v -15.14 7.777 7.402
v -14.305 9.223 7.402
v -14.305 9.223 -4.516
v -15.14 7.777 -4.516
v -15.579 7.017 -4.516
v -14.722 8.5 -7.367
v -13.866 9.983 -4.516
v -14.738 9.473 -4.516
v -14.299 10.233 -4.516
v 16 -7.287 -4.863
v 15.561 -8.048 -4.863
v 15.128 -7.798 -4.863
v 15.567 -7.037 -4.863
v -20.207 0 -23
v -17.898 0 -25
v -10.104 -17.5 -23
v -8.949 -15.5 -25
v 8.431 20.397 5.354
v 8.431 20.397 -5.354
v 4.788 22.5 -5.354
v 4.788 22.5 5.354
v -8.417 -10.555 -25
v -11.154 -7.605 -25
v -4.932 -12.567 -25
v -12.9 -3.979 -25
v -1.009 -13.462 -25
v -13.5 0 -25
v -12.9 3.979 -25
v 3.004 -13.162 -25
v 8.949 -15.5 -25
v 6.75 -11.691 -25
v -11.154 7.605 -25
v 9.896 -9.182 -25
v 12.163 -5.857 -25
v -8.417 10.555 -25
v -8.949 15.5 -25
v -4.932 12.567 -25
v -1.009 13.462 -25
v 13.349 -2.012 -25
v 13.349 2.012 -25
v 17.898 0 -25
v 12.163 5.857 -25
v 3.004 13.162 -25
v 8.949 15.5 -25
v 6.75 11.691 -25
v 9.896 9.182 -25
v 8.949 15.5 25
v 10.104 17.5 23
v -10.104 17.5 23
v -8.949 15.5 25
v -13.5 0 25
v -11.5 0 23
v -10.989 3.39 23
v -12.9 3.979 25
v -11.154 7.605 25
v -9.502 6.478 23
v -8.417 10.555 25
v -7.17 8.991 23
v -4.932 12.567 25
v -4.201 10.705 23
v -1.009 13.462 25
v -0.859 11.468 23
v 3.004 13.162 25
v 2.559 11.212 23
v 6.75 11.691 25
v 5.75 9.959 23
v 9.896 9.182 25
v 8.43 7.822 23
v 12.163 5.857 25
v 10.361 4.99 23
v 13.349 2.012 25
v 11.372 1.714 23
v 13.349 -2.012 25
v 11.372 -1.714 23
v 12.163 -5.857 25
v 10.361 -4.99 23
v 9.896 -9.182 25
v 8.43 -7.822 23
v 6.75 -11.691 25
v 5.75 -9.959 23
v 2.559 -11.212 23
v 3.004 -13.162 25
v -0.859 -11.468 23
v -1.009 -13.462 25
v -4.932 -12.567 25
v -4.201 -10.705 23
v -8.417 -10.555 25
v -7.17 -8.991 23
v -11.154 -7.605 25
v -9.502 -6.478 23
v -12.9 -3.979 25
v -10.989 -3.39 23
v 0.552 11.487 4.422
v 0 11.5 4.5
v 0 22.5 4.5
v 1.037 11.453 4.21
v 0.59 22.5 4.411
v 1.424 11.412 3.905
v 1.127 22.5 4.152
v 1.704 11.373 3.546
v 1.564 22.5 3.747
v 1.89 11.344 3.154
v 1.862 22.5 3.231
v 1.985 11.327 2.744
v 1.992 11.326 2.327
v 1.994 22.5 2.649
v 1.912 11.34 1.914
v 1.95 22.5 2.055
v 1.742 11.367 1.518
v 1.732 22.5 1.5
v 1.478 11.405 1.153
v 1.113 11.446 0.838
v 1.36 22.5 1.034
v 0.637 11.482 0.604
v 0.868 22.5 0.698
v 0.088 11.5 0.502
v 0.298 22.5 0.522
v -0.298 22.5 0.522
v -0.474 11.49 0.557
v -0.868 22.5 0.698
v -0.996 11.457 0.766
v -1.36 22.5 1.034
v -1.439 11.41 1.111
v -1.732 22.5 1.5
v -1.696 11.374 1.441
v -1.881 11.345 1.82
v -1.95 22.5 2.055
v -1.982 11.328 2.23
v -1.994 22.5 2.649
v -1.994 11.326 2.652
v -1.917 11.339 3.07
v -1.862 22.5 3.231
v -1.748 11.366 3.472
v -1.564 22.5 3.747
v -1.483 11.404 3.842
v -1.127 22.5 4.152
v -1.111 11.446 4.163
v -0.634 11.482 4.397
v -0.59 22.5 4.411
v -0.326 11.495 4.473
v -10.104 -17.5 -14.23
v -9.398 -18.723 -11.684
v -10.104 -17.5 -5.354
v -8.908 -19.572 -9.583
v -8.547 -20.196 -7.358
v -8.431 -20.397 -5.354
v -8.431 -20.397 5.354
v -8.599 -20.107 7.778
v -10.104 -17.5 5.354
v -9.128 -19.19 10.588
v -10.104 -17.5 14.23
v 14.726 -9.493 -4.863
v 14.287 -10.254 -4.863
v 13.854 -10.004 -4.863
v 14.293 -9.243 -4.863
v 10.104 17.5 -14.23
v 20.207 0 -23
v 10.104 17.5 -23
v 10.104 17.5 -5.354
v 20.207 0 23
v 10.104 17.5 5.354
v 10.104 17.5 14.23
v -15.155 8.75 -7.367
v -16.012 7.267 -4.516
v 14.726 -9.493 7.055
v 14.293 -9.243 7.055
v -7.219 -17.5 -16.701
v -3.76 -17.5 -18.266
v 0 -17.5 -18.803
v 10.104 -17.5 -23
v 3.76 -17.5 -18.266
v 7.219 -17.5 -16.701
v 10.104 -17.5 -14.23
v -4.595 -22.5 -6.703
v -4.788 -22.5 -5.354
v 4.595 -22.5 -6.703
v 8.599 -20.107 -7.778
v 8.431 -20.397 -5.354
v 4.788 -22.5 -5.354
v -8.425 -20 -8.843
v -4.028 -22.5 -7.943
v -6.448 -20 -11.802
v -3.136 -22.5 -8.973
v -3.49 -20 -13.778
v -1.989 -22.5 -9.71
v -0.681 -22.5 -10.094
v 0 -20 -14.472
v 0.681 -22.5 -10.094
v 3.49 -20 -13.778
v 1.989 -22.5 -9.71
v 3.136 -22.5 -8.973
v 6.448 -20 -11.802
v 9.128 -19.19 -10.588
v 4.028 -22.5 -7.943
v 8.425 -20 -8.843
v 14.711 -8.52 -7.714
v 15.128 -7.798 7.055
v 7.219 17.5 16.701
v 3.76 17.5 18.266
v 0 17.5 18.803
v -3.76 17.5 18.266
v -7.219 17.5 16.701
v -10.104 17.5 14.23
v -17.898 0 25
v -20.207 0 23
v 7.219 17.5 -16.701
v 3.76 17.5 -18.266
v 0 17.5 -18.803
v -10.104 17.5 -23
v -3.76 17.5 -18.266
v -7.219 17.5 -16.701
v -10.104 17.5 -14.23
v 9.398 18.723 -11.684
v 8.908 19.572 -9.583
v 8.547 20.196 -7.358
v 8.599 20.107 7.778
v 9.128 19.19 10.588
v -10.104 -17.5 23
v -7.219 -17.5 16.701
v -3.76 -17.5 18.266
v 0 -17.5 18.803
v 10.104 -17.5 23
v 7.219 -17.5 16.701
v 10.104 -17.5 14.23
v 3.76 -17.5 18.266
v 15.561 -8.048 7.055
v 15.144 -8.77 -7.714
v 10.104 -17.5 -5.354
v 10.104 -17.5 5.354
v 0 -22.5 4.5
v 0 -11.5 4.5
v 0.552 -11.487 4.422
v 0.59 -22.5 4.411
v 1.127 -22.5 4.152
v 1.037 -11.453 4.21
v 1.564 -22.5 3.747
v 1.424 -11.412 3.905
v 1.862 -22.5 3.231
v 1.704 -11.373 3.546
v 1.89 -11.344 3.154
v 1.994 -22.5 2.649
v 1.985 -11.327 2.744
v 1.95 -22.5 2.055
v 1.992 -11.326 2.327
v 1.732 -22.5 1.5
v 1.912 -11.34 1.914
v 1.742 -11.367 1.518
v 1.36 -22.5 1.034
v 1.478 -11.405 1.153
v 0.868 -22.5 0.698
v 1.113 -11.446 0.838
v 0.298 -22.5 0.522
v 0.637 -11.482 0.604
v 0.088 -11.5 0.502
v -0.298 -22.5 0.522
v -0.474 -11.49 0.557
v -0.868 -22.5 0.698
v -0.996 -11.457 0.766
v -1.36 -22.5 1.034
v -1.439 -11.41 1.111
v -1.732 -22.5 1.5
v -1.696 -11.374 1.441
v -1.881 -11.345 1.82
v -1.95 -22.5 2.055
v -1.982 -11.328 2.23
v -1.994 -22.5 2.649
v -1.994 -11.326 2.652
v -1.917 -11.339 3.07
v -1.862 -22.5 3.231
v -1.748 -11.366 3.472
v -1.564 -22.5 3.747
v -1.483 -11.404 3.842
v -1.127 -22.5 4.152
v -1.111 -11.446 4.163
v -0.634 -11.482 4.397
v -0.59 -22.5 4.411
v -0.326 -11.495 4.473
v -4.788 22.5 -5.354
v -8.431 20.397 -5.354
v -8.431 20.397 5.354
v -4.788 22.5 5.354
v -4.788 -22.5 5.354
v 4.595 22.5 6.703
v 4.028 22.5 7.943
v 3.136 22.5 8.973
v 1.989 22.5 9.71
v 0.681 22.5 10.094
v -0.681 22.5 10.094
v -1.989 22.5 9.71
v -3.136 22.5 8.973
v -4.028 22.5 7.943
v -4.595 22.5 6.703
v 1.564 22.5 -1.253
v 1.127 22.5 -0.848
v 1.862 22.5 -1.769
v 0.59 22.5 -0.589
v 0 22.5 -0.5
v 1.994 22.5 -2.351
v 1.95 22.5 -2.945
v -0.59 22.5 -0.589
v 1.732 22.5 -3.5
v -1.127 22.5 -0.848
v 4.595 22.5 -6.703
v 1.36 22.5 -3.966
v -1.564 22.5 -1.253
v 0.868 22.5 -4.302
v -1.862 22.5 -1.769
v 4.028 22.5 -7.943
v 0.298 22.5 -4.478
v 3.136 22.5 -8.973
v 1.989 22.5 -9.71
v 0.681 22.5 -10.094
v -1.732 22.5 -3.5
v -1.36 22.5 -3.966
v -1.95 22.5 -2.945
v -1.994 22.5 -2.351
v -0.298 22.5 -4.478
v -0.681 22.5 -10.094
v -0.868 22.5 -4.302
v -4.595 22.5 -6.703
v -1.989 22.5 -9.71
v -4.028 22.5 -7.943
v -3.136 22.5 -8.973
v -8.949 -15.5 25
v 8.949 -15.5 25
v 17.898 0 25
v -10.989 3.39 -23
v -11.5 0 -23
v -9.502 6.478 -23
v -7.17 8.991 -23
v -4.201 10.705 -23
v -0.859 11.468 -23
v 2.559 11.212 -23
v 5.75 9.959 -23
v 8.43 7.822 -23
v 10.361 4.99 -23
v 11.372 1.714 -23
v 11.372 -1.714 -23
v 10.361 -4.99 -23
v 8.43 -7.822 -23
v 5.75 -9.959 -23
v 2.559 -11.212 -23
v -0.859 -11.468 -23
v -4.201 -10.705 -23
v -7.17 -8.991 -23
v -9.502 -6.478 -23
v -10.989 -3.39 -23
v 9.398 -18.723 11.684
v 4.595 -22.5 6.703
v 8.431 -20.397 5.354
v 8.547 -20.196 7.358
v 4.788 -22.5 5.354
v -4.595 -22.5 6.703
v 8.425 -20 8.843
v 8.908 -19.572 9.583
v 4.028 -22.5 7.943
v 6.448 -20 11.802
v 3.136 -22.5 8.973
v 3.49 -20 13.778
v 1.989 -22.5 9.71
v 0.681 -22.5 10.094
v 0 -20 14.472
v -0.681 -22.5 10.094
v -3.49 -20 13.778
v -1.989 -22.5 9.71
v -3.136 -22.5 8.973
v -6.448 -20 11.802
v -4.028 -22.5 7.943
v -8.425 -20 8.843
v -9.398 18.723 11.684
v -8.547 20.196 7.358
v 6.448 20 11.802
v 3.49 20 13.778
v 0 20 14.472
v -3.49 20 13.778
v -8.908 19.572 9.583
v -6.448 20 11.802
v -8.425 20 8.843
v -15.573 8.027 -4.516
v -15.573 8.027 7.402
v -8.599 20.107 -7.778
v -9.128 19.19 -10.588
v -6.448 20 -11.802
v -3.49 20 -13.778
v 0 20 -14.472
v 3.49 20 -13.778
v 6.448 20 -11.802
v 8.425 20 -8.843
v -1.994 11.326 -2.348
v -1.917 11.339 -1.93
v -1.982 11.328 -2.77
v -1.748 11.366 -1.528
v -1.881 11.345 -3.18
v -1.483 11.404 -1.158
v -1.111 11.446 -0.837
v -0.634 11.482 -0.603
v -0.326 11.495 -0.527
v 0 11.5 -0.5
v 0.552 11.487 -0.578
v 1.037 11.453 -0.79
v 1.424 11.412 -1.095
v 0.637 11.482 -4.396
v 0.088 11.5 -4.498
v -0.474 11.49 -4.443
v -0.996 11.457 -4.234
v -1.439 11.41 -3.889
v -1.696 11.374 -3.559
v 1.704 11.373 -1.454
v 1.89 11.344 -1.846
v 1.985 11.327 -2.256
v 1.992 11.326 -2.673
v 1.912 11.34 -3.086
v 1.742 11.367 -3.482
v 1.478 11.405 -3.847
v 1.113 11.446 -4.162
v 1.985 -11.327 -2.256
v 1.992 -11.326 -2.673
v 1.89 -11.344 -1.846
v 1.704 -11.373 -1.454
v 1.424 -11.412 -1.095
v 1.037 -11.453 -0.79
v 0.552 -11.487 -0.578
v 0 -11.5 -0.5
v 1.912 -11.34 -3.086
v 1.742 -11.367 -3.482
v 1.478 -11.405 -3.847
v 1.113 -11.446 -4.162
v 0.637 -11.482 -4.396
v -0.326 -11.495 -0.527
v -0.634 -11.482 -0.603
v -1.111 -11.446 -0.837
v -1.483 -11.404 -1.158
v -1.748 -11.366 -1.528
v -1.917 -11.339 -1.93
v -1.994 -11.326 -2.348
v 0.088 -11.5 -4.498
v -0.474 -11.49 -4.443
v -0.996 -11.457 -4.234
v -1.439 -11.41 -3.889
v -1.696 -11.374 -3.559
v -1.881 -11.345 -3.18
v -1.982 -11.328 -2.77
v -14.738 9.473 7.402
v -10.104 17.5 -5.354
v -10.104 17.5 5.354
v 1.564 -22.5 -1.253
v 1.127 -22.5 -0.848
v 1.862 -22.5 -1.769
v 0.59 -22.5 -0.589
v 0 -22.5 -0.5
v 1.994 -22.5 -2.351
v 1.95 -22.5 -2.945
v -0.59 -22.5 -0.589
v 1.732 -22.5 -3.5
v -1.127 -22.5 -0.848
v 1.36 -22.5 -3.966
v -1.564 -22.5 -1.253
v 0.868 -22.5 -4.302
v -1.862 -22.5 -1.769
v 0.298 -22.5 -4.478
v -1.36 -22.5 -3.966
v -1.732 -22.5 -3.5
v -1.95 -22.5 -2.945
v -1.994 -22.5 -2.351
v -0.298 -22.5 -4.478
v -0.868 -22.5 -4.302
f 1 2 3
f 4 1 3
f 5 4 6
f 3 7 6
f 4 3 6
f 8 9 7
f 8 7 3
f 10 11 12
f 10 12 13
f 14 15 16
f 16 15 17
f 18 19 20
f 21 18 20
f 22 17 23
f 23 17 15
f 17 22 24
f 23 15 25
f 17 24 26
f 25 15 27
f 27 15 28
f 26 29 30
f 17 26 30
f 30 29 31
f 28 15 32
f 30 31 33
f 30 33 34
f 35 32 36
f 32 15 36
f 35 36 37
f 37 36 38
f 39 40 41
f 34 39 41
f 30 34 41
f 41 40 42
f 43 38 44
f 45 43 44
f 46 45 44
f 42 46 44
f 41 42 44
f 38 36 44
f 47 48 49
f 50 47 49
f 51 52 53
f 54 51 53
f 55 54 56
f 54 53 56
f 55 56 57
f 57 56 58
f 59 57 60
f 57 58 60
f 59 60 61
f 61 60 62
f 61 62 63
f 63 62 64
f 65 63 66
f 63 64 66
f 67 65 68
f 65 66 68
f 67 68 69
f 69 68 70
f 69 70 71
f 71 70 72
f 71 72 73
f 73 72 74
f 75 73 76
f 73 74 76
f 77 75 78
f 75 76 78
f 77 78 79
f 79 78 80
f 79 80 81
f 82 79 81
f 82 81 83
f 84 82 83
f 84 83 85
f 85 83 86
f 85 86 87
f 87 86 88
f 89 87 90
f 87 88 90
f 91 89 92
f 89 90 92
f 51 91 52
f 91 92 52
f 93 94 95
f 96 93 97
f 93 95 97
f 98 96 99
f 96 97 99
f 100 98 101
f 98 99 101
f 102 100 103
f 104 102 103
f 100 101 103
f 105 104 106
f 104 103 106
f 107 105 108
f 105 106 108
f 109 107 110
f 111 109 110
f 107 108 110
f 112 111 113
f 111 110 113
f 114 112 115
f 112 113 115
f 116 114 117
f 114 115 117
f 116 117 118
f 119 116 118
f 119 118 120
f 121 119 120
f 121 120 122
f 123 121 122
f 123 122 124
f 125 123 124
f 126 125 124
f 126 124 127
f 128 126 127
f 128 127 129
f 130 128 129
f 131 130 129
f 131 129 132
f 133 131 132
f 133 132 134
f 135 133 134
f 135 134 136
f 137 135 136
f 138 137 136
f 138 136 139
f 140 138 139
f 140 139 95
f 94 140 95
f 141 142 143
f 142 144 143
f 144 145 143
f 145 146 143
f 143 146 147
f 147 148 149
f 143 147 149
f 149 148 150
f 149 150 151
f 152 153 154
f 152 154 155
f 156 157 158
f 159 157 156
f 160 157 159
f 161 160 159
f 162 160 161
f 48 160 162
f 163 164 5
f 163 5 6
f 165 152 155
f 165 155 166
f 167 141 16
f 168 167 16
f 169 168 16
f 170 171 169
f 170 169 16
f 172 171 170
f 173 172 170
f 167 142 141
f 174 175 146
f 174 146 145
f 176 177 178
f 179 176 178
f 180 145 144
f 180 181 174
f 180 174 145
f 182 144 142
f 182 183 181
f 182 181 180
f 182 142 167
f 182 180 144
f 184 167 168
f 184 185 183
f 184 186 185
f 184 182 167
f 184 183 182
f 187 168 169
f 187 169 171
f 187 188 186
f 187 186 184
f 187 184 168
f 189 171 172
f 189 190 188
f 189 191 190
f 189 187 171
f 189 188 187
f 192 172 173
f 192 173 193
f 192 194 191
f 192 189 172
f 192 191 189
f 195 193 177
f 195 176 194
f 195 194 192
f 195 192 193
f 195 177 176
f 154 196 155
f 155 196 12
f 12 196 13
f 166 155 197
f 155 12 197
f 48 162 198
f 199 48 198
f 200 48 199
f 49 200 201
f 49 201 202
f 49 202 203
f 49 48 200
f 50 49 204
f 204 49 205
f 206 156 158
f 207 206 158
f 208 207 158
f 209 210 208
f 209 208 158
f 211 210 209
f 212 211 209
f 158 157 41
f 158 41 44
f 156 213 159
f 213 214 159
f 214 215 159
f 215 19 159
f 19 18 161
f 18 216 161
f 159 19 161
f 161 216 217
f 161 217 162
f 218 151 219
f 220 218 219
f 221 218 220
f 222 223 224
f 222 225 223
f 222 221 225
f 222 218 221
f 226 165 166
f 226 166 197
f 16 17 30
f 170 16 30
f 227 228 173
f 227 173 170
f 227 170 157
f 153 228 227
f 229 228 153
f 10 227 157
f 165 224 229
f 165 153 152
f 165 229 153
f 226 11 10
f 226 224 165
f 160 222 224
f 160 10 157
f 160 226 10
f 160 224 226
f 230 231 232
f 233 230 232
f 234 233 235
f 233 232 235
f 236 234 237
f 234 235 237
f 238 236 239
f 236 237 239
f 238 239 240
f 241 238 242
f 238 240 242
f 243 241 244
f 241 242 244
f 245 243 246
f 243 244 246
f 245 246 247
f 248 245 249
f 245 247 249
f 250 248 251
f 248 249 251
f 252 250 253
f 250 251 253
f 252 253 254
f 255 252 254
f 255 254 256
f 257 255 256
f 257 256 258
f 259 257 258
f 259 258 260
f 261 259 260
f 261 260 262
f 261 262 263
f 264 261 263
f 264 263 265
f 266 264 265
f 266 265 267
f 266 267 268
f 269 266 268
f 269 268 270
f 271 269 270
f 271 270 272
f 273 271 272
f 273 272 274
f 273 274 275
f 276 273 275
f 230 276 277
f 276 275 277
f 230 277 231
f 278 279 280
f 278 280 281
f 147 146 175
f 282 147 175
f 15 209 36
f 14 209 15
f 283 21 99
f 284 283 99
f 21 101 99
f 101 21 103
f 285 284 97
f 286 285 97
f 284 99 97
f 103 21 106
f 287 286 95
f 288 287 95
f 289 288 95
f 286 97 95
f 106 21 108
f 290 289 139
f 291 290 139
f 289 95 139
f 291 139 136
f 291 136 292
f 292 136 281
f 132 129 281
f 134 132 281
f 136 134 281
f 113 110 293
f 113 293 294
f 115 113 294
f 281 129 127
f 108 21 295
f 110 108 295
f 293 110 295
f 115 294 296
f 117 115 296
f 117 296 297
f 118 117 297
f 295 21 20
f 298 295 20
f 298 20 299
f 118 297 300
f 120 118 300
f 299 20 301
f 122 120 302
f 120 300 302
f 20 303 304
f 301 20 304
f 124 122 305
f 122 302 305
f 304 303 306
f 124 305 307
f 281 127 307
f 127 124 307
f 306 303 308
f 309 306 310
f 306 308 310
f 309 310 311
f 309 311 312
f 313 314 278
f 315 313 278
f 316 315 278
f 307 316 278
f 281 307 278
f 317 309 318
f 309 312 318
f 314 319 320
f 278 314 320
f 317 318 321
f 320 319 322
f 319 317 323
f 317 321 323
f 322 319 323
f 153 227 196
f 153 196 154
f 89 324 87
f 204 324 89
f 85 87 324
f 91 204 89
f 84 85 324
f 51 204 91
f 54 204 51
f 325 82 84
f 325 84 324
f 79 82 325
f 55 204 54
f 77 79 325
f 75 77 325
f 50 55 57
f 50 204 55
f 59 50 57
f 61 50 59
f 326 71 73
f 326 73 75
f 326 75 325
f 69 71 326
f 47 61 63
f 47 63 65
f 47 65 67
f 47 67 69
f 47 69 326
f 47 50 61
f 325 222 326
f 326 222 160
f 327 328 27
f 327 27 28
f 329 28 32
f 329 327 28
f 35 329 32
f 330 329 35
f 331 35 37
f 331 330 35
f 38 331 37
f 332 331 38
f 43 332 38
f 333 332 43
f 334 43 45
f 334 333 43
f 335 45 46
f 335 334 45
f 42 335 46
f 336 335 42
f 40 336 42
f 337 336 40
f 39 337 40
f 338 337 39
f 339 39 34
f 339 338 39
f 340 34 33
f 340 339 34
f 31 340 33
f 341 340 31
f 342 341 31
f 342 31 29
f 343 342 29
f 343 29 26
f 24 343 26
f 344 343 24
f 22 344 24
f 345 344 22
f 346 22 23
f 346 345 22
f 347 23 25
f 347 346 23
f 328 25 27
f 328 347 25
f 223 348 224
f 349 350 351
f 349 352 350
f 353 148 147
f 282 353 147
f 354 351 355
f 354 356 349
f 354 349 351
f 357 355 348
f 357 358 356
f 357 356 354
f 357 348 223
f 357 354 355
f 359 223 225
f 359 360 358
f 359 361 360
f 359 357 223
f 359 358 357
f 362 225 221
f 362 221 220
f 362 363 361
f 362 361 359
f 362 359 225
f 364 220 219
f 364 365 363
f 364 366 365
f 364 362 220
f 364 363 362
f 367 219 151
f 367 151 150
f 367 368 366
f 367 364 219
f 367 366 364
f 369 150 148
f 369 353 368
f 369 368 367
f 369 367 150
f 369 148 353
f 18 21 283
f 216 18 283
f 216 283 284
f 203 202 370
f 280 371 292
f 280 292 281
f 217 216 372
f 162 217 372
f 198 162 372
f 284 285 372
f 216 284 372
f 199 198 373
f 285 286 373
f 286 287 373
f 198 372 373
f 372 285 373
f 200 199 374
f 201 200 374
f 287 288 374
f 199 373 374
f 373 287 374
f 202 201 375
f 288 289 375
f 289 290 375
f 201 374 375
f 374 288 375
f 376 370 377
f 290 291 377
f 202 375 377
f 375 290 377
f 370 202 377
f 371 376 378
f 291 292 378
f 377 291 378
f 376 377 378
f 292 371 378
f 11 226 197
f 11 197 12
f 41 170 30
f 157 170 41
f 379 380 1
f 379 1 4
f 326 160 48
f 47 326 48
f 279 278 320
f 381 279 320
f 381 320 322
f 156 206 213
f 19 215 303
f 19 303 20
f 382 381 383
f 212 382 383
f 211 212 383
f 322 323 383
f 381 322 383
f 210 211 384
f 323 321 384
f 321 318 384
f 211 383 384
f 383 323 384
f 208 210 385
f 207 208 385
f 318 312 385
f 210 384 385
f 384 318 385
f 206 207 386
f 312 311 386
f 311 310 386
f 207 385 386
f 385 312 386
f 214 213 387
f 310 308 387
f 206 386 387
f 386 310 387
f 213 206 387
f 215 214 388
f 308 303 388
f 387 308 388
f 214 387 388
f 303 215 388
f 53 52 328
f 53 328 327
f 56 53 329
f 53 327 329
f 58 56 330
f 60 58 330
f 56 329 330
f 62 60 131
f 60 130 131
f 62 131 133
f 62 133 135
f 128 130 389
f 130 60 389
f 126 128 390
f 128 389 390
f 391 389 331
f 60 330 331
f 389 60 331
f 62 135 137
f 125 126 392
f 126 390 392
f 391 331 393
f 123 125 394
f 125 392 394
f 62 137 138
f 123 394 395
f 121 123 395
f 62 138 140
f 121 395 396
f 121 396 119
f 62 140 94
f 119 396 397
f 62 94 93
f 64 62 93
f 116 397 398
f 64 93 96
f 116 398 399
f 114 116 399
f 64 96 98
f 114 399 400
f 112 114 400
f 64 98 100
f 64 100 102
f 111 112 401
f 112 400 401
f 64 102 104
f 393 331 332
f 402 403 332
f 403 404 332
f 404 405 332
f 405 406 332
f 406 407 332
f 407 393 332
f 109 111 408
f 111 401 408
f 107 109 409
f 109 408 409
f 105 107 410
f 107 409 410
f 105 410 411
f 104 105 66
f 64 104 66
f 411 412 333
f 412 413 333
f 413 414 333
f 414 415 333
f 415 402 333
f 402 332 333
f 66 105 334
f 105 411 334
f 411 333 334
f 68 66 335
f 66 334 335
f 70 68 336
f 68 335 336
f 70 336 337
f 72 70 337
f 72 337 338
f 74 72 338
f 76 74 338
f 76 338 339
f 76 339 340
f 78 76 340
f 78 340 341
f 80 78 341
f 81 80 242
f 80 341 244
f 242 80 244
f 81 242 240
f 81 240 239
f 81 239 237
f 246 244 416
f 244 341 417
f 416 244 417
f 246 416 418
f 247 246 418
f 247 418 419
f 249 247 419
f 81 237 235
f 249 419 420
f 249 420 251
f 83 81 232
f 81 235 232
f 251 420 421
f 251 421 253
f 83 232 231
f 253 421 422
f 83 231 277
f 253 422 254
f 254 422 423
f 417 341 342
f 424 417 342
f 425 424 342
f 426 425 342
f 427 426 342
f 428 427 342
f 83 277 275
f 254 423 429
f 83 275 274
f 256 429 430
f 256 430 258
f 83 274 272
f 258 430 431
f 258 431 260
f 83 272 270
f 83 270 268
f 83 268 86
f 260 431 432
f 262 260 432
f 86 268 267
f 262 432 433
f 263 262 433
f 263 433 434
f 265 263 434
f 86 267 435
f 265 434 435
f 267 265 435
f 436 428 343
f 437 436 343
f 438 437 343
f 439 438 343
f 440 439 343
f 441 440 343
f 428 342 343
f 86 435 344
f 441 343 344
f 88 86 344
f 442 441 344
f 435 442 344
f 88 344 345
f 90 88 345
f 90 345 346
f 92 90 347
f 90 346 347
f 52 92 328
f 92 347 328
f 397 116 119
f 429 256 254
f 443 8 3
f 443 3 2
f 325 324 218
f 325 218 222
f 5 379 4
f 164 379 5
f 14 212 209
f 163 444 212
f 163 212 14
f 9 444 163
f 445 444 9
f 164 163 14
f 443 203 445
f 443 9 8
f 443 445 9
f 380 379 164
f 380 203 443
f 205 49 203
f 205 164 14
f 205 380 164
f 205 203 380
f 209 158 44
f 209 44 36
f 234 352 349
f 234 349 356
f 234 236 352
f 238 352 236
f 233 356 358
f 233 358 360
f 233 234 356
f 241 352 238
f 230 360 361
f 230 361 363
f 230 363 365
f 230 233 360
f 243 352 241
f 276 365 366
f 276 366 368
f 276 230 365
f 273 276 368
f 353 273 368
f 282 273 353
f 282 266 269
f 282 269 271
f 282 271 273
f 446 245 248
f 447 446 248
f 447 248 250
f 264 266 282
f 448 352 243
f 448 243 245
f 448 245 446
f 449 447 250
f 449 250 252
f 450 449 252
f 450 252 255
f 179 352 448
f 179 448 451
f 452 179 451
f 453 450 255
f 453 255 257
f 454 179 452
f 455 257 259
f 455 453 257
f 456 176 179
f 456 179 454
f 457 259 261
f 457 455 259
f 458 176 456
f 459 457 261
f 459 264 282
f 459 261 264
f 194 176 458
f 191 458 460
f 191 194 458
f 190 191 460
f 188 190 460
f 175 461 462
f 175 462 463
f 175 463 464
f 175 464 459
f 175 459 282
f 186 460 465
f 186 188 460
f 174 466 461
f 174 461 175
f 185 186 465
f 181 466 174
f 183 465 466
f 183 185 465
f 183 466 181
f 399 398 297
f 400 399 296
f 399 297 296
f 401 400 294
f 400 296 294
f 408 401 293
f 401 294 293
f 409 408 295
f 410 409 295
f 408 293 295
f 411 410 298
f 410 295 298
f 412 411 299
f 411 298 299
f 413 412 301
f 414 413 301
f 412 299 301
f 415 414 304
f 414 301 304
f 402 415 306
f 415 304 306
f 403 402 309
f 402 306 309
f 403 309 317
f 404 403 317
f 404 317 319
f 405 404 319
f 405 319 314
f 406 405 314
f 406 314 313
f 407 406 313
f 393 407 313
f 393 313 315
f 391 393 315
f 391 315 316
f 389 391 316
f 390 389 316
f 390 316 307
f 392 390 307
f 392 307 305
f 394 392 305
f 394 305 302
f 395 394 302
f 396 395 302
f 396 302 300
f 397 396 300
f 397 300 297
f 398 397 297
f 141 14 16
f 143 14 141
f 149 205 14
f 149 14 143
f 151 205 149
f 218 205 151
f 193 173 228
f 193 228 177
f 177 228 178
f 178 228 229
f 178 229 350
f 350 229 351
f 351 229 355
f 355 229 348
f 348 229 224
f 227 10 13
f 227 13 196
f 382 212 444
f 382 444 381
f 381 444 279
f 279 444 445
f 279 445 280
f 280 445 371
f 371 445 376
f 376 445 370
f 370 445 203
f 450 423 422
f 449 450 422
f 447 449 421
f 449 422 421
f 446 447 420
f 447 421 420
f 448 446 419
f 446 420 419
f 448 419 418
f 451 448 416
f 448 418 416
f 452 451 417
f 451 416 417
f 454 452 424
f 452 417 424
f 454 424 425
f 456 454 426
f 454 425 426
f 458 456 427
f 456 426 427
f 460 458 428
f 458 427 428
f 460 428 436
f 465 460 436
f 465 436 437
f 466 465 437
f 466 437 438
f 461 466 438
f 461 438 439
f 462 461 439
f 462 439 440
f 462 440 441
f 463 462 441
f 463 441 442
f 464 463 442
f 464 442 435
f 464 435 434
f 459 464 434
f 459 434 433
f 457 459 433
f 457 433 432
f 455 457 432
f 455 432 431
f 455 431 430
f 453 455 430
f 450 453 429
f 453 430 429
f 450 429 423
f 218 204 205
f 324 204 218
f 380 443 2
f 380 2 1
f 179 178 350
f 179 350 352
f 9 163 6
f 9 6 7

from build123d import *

# Parameters (mm, degrees)
BOSS_EXTRUDE1_DEPTH      = 25
BOSS_EXTRUDE2_DEPTH      = 5
BOSS_EXTRUDE2_DEPTH_BACK = 40
SKETCH6_R                = 2
CUT_EXTRUDE2_DEPTH       = 56.302200077
SKETCH7_R                = 11.5
CUT_EXTRUDE3_DEPTH       = 59.434436194
CHAMFER3_SIZE            = 2
CHAMFER4_SIZE            = 8.660254038
CHAMFER4_SIZE_2          = 5
CUT_EXTRUDE4_DEPTH       = 0.5
CUT_EXTRUDE5_DEPTH       = 0.5


with BuildPart() as part:
    # Sketch1 → Boss-Extrude1 (new, symmetric)
    with BuildSketch(Plane.XY):
        Polygon((10.103629711, 17.5), (-10.103629711, 17.5), (-20.207259422, 0), (-10.103629711, -17.5), (10.103629711, -17.5), (20.207259422, 0), align=None)
    extrude(amount=BOSS_EXTRUDE1_DEPTH, both=True)

    # Sketch2 → Boss-Extrude2 (add, two sides: drawn at the far end of the back side and taken through both)
    with BuildSketch(Plane(origin=(0, 17.5, 0), x_dir=(1, 0, 0), z_dir=(0, 1, 0)).offset(-BOSS_EXTRUDE2_DEPTH_BACK)):
        with BuildLine():
            Line((-4.788486146, -5.353793539), (-4.788486146, 5.353793539))
            ThreePointArc((-4.788486146, 5.353793539), (0, 10.142279685), (4.788486146, 5.353793539))
            Line((4.788486146, 5.353793539), (4.788486146, -5.353793539))
            ThreePointArc((4.788486146, -5.353793539), (0, -10.142279685), (-4.788486146, -5.353793539))
        make_face()
    extrude(amount=BOSS_EXTRUDE2_DEPTH + BOSS_EXTRUDE2_DEPTH_BACK)

    # Sketch6 → Cut-Extrude2 (cut, through all)
    with BuildSketch(Plane(origin=(0, 22.5, 0), x_dir=(1, 0, 0), z_dir=(0, 1, 0))):
        with Locations(Location((0, -2.5, 0), (0, 0, 270))):
            Circle(SKETCH6_R)
        with Locations(Location((0, 2.5, 0), (0, 0, 270))):
            Circle(SKETCH6_R)
    extrude(amount=-CUT_EXTRUDE2_DEPTH, mode=Mode.SUBTRACT)

    # Sketch7 → Cut-Extrude3 (cut, through all)
    with BuildSketch(Plane(origin=(0, 0, -25), x_dir=(-1, 0, 0), z_dir=(0, 0, -1))):
        Circle(SKETCH7_R)
    extrude(amount=-CUT_EXTRUDE3_DEPTH, mode=Mode.SUBTRACT)

    # Chamfer3
    chamfer3_edges = [part.edges().sort_by_distance(p)[0] for p in [
        (-15.155444566, 8.75, 25),
        (-15.155444566, -8.75, 25),
        (0, -17.5, 25),
        (15.155444566, -8.75, 25),
        (15.155444566, 8.75, 25),
        (11.5, 0, 25),
        (11.5, 0, -25),
        (15.155444566, -8.75, -25),
        (0, -17.5, -25),
        (-15.155444566, -8.75, -25),
        (0, 17.5, 25),
        (-15.155444566, 8.75, -25),
        (0, 17.5, -25),
        (15.155444566, 8.75, -25),
    ]]
    chamfer(chamfer3_edges, length=CHAMFER3_SIZE)

    # Chamfer4
    # the kernel refuses this chamfer: 8.660254038, 5 mm, written as the material it adds along each edge
    with BuildSketch(Plane(origin=(4.788486146, -17.5, -5.353793539), x_dir=(0.9998132206222078, 0.019326765612700893, 0), z_dir=(0, 0, 1))) as chamfer4_piece_1_section:
        Polygon((CHAMFER4_SIZE * 0.999813220604, -CHAMFER4_SIZE * 0.0193267656124), (-CHAMFER4_SIZE_2 * 0.0193267656127, -CHAMFER4_SIZE_2 * 0.999813220622), (0, 0), align=None)
    chamfer4_piece_1 = extrude(amount=10.707587077, mode=Mode.PRIVATE)
    chamfer4_piece_1 = split(chamfer4_piece_1, bisect_by=Plane(origin=(8.460633685, -20.345752593, 0), z_dir=(-0.8660254037844387, 0.4999999999999999, 0)), keep=Keep.TOP, mode=Mode.PRIVATE)
    chamfer4_piece_1 = split(chamfer4_piece_1, bisect_by=Plane(origin=(6.722843937, -22.5, 0), z_dir=(0, 1, 0)), keep=Keep.TOP, mode=Mode.PRIVATE)
    add(chamfer4_piece_1)
    with BuildSketch(Plane(origin=(0, -17.5, -5.353793539), x_dir=(-1, 0, 0), z_dir=(0, 0, 1))) as chamfer4_piece_2_section:
        Polygon((4.788486146 + CHAMFER4_SIZE, 0), (4.788486146, CHAMFER4_SIZE_2), (4.788486146, 0), align=None)
    chamfer4_piece_2 = revolve(axis=Axis((0, -17.5, -5.353793539), (0, -1, 0)), revolution_arc=180, mode=Mode.PRIVATE)
    chamfer4_piece_2 = split(chamfer4_piece_2, bisect_by=Plane(origin=(6.935994124, -22.986505777, -10.917233829), z_dir=(-0.8660254037844387, 0.4999999999999999, 0)), keep=Keep.TOP, mode=Mode.PRIVATE)
    chamfer4_piece_2 = split(chamfer4_piece_2, bisect_by=Plane(origin=(-6.935994098, -22.986505822, -10.917233829), z_dir=(0.8660254037844385, 0.5000000000000003, 0)), keep=Keep.TOP, mode=Mode.PRIVATE)
    chamfer4_piece_2 = split(chamfer4_piece_2, bisect_by=Plane(origin=(5.2e-08, -22.5, -10.917233829), z_dir=(0, 1, 0)), keep=Keep.TOP, mode=Mode.PRIVATE)
    add(chamfer4_piece_2)
    with BuildSketch(Plane(origin=(0, -17.5, 5.353793539), x_dir=(1, 0, 0), z_dir=(0, 0, -1))) as chamfer4_piece_3_section:
        Polygon((4.788486146 + CHAMFER4_SIZE, 0), (4.788486146, CHAMFER4_SIZE_2), (4.788486146, 0), align=None)
    chamfer4_piece_3 = revolve(axis=Axis((0, -17.5, 5.353793539), (0, -1, 0)), revolution_arc=180, mode=Mode.PRIVATE)
    chamfer4_piece_3 = split(chamfer4_piece_3, bisect_by=Plane(origin=(6.935994128, -22.98650577, 10.917233836), z_dir=(-0.8660254037844387, 0.4999999999999999, 0)), keep=Keep.TOP, mode=Mode.PRIVATE)
    chamfer4_piece_3 = split(chamfer4_piece_3, bisect_by=Plane(origin=(-6.935994097, -22.986505824, 10.917233836), z_dir=(0.8660254037844385, 0.5000000000000003, 0)), keep=Keep.TOP, mode=Mode.PRIVATE)
    chamfer4_piece_3 = split(chamfer4_piece_3, bisect_by=Plane(origin=(6.2e-08, -22.5, 10.917233836), z_dir=(0, 1, 0)), keep=Keep.TOP, mode=Mode.PRIVATE)
    add(chamfer4_piece_3)
    with BuildSketch(Plane(origin=(-4.788486146, -17.5, 5.353793539), x_dir=(-0.999813220622208, 0.019326765612700497, 0), z_dir=(0, 0, -1))) as chamfer4_piece_4_section:
        Polygon((CHAMFER4_SIZE * 0.999813220604, -CHAMFER4_SIZE * 0.0193267656124), (-CHAMFER4_SIZE_2 * 0.0193267656127, -CHAMFER4_SIZE_2 * 0.999813220622), (0, 0), align=None)
    chamfer4_piece_4 = extrude(amount=10.707587077, mode=Mode.PRIVATE)
    chamfer4_piece_4 = split(chamfer4_piece_4, bisect_by=Plane(origin=(-8.460633685, -20.345752593, 0), z_dir=(0.8660254037844385, 0.5000000000000003, 0)), keep=Keep.TOP, mode=Mode.PRIVATE)
    chamfer4_piece_4 = split(chamfer4_piece_4, bisect_by=Plane(origin=(-6.722843937, -22.5, 0), z_dir=(0, 1, 0)), keep=Keep.TOP, mode=Mode.PRIVATE)
    add(chamfer4_piece_4)
    with BuildSketch(Plane(origin=(-4.788486146, 17.5, -5.353793539), x_dir=(-0.999813220622208, -0.019326765612700497, 0), z_dir=(0, 0, 1))) as chamfer4_piece_5_section:
        Polygon((CHAMFER4_SIZE * 0.999813220604, -CHAMFER4_SIZE * 0.0193267656124), (-CHAMFER4_SIZE_2 * 0.0193267656127, -CHAMFER4_SIZE_2 * 0.999813220622), (0, 0), align=None)
    chamfer4_piece_5 = extrude(amount=10.707587077, mode=Mode.PRIVATE)
    chamfer4_piece_5 = split(chamfer4_piece_5, bisect_by=Plane(origin=(-8.460633685, 20.345752593, 0), z_dir=(0.8660254037844388, -0.49999999999999983, 0)), keep=Keep.TOP, mode=Mode.PRIVATE)
    chamfer4_piece_5 = split(chamfer4_piece_5, bisect_by=Plane(origin=(-6.722843937, 22.5, 0), z_dir=(0, -1, 0)), keep=Keep.TOP, mode=Mode.PRIVATE)
    add(chamfer4_piece_5)
    with BuildSketch(Plane(origin=(0, 17.5, 5.353793539), x_dir=(1, 0, 0), z_dir=(0, 0, -1))) as chamfer4_piece_6_section:
        Polygon((4.788486146 + CHAMFER4_SIZE, 0), (4.788486146, -CHAMFER4_SIZE_2), (4.788486146, 0), align=None)
    chamfer4_piece_6 = revolve(axis=Axis((0, 17.5, 5.353793539), (0, -1, 0)), revolution_arc=180, mode=Mode.PRIVATE)
    chamfer4_piece_6 = split(chamfer4_piece_6, bisect_by=Plane(origin=(6.935994103, 22.986505812, 10.917233841), z_dir=(-0.8660254037844387, -0.5000000000000003, 0)), keep=Keep.TOP, mode=Mode.PRIVATE)
    chamfer4_piece_6 = split(chamfer4_piece_6, bisect_by=Plane(origin=(-6.935994125, 22.986505774, 10.917233841), z_dir=(0.8660254037844388, -0.49999999999999983, 0)), keep=Keep.TOP, mode=Mode.PRIVATE)
    chamfer4_piece_6 = split(chamfer4_piece_6, bisect_by=Plane(origin=(-4.4e-08, 22.5, 10.917233841), z_dir=(0, -1, 0)), keep=Keep.TOP, mode=Mode.PRIVATE)
    add(chamfer4_piece_6)
    with BuildSketch(Plane(origin=(0, 17.5, -5.353793539), x_dir=(-1, 0, 0), z_dir=(0, 0, 1))) as chamfer4_piece_7_section:
        Polygon((4.788486146 + CHAMFER4_SIZE, 0), (4.788486146, -CHAMFER4_SIZE_2), (4.788486146, 0), align=None)
    chamfer4_piece_7 = revolve(axis=Axis((0, 17.5, -5.353793539), (0, -1, 0)), revolution_arc=180, mode=Mode.PRIVATE)
    chamfer4_piece_7 = split(chamfer4_piece_7, bisect_by=Plane(origin=(6.935994097, 22.986505823, -10.917233827), z_dir=(-0.8660254037844387, -0.5000000000000003, 0)), keep=Keep.TOP, mode=Mode.PRIVATE)
    chamfer4_piece_7 = split(chamfer4_piece_7, bisect_by=Plane(origin=(-6.93599412, 22.986505784, -10.917233827), z_dir=(0.8660254037844388, -0.49999999999999983, 0)), keep=Keep.TOP, mode=Mode.PRIVATE)
    chamfer4_piece_7 = split(chamfer4_piece_7, bisect_by=Plane(origin=(-4.6e-08, 22.5, -10.917233827), z_dir=(0, -1, 0)), keep=Keep.TOP, mode=Mode.PRIVATE)
    add(chamfer4_piece_7)
    with BuildSketch(Plane(origin=(4.788486146, 17.5, 5.353793539), x_dir=(0.999813220622208, -0.019326765612700497, 0), z_dir=(0, 0, -1))) as chamfer4_piece_8_section:
        Polygon((CHAMFER4_SIZE * 0.999813220604, -CHAMFER4_SIZE * 0.0193267656124), (-CHAMFER4_SIZE_2 * 0.0193267656127, -CHAMFER4_SIZE_2 * 0.999813220622), (0, 0), align=None)
    chamfer4_piece_8 = extrude(amount=10.707587077, mode=Mode.PRIVATE)
    chamfer4_piece_8 = split(chamfer4_piece_8, bisect_by=Plane(origin=(8.460633685, 20.345752593, 0), z_dir=(-0.8660254037844387, -0.5000000000000003, 0)), keep=Keep.TOP, mode=Mode.PRIVATE)
    chamfer4_piece_8 = split(chamfer4_piece_8, bisect_by=Plane(origin=(6.722843937, 22.5, 0), z_dir=(0, -1, 0)), keep=Keep.TOP, mode=Mode.PRIVATE)
    add(chamfer4_piece_8)

    # Sketch8 → Cut-Extrude4 (cut)
    with BuildSketch(Plane(origin=(15.155444566, -8.75, 0), x_dir=(0, 0, -1), z_dir=(0.8660254037844387, -0.49999999999999983, 0))):
        Polygon((4.862923627, 0.810905121), (4.862923627, 1.689163545), (7.714387746, -0.02362609), (4.862923627, -1.736415726), (4.862923627, -0.858157301), (-7.055157189, -0.858157301), (-7.055157189, 0.810905121), align=None)
    extrude(amount=-CUT_EXTRUDE4_DEPTH, mode=Mode.SUBTRACT)

    # Sketch9 → Cut-Extrude5 (cut)
    with BuildSketch(Plane(origin=(-15.155444566, 8.75, 0), x_dir=(0, 0, 1), z_dir=(-0.8660254037844389, 0.49999999999999983, 0))):
        Polygon((-4.515922363, -0.834531211), (-4.515922363, -1.712789635), (-7.367386481, 0), (-4.515922363, 1.712789635), (-4.515922363, 0.834531211), (7.402158453, 0.834531211), (7.402158453, -0.834531211), align=None)
    extrude(amount=-CUT_EXTRUDE5_DEPTH, mode=Mode.SUBTRACT)


solid = part.part
